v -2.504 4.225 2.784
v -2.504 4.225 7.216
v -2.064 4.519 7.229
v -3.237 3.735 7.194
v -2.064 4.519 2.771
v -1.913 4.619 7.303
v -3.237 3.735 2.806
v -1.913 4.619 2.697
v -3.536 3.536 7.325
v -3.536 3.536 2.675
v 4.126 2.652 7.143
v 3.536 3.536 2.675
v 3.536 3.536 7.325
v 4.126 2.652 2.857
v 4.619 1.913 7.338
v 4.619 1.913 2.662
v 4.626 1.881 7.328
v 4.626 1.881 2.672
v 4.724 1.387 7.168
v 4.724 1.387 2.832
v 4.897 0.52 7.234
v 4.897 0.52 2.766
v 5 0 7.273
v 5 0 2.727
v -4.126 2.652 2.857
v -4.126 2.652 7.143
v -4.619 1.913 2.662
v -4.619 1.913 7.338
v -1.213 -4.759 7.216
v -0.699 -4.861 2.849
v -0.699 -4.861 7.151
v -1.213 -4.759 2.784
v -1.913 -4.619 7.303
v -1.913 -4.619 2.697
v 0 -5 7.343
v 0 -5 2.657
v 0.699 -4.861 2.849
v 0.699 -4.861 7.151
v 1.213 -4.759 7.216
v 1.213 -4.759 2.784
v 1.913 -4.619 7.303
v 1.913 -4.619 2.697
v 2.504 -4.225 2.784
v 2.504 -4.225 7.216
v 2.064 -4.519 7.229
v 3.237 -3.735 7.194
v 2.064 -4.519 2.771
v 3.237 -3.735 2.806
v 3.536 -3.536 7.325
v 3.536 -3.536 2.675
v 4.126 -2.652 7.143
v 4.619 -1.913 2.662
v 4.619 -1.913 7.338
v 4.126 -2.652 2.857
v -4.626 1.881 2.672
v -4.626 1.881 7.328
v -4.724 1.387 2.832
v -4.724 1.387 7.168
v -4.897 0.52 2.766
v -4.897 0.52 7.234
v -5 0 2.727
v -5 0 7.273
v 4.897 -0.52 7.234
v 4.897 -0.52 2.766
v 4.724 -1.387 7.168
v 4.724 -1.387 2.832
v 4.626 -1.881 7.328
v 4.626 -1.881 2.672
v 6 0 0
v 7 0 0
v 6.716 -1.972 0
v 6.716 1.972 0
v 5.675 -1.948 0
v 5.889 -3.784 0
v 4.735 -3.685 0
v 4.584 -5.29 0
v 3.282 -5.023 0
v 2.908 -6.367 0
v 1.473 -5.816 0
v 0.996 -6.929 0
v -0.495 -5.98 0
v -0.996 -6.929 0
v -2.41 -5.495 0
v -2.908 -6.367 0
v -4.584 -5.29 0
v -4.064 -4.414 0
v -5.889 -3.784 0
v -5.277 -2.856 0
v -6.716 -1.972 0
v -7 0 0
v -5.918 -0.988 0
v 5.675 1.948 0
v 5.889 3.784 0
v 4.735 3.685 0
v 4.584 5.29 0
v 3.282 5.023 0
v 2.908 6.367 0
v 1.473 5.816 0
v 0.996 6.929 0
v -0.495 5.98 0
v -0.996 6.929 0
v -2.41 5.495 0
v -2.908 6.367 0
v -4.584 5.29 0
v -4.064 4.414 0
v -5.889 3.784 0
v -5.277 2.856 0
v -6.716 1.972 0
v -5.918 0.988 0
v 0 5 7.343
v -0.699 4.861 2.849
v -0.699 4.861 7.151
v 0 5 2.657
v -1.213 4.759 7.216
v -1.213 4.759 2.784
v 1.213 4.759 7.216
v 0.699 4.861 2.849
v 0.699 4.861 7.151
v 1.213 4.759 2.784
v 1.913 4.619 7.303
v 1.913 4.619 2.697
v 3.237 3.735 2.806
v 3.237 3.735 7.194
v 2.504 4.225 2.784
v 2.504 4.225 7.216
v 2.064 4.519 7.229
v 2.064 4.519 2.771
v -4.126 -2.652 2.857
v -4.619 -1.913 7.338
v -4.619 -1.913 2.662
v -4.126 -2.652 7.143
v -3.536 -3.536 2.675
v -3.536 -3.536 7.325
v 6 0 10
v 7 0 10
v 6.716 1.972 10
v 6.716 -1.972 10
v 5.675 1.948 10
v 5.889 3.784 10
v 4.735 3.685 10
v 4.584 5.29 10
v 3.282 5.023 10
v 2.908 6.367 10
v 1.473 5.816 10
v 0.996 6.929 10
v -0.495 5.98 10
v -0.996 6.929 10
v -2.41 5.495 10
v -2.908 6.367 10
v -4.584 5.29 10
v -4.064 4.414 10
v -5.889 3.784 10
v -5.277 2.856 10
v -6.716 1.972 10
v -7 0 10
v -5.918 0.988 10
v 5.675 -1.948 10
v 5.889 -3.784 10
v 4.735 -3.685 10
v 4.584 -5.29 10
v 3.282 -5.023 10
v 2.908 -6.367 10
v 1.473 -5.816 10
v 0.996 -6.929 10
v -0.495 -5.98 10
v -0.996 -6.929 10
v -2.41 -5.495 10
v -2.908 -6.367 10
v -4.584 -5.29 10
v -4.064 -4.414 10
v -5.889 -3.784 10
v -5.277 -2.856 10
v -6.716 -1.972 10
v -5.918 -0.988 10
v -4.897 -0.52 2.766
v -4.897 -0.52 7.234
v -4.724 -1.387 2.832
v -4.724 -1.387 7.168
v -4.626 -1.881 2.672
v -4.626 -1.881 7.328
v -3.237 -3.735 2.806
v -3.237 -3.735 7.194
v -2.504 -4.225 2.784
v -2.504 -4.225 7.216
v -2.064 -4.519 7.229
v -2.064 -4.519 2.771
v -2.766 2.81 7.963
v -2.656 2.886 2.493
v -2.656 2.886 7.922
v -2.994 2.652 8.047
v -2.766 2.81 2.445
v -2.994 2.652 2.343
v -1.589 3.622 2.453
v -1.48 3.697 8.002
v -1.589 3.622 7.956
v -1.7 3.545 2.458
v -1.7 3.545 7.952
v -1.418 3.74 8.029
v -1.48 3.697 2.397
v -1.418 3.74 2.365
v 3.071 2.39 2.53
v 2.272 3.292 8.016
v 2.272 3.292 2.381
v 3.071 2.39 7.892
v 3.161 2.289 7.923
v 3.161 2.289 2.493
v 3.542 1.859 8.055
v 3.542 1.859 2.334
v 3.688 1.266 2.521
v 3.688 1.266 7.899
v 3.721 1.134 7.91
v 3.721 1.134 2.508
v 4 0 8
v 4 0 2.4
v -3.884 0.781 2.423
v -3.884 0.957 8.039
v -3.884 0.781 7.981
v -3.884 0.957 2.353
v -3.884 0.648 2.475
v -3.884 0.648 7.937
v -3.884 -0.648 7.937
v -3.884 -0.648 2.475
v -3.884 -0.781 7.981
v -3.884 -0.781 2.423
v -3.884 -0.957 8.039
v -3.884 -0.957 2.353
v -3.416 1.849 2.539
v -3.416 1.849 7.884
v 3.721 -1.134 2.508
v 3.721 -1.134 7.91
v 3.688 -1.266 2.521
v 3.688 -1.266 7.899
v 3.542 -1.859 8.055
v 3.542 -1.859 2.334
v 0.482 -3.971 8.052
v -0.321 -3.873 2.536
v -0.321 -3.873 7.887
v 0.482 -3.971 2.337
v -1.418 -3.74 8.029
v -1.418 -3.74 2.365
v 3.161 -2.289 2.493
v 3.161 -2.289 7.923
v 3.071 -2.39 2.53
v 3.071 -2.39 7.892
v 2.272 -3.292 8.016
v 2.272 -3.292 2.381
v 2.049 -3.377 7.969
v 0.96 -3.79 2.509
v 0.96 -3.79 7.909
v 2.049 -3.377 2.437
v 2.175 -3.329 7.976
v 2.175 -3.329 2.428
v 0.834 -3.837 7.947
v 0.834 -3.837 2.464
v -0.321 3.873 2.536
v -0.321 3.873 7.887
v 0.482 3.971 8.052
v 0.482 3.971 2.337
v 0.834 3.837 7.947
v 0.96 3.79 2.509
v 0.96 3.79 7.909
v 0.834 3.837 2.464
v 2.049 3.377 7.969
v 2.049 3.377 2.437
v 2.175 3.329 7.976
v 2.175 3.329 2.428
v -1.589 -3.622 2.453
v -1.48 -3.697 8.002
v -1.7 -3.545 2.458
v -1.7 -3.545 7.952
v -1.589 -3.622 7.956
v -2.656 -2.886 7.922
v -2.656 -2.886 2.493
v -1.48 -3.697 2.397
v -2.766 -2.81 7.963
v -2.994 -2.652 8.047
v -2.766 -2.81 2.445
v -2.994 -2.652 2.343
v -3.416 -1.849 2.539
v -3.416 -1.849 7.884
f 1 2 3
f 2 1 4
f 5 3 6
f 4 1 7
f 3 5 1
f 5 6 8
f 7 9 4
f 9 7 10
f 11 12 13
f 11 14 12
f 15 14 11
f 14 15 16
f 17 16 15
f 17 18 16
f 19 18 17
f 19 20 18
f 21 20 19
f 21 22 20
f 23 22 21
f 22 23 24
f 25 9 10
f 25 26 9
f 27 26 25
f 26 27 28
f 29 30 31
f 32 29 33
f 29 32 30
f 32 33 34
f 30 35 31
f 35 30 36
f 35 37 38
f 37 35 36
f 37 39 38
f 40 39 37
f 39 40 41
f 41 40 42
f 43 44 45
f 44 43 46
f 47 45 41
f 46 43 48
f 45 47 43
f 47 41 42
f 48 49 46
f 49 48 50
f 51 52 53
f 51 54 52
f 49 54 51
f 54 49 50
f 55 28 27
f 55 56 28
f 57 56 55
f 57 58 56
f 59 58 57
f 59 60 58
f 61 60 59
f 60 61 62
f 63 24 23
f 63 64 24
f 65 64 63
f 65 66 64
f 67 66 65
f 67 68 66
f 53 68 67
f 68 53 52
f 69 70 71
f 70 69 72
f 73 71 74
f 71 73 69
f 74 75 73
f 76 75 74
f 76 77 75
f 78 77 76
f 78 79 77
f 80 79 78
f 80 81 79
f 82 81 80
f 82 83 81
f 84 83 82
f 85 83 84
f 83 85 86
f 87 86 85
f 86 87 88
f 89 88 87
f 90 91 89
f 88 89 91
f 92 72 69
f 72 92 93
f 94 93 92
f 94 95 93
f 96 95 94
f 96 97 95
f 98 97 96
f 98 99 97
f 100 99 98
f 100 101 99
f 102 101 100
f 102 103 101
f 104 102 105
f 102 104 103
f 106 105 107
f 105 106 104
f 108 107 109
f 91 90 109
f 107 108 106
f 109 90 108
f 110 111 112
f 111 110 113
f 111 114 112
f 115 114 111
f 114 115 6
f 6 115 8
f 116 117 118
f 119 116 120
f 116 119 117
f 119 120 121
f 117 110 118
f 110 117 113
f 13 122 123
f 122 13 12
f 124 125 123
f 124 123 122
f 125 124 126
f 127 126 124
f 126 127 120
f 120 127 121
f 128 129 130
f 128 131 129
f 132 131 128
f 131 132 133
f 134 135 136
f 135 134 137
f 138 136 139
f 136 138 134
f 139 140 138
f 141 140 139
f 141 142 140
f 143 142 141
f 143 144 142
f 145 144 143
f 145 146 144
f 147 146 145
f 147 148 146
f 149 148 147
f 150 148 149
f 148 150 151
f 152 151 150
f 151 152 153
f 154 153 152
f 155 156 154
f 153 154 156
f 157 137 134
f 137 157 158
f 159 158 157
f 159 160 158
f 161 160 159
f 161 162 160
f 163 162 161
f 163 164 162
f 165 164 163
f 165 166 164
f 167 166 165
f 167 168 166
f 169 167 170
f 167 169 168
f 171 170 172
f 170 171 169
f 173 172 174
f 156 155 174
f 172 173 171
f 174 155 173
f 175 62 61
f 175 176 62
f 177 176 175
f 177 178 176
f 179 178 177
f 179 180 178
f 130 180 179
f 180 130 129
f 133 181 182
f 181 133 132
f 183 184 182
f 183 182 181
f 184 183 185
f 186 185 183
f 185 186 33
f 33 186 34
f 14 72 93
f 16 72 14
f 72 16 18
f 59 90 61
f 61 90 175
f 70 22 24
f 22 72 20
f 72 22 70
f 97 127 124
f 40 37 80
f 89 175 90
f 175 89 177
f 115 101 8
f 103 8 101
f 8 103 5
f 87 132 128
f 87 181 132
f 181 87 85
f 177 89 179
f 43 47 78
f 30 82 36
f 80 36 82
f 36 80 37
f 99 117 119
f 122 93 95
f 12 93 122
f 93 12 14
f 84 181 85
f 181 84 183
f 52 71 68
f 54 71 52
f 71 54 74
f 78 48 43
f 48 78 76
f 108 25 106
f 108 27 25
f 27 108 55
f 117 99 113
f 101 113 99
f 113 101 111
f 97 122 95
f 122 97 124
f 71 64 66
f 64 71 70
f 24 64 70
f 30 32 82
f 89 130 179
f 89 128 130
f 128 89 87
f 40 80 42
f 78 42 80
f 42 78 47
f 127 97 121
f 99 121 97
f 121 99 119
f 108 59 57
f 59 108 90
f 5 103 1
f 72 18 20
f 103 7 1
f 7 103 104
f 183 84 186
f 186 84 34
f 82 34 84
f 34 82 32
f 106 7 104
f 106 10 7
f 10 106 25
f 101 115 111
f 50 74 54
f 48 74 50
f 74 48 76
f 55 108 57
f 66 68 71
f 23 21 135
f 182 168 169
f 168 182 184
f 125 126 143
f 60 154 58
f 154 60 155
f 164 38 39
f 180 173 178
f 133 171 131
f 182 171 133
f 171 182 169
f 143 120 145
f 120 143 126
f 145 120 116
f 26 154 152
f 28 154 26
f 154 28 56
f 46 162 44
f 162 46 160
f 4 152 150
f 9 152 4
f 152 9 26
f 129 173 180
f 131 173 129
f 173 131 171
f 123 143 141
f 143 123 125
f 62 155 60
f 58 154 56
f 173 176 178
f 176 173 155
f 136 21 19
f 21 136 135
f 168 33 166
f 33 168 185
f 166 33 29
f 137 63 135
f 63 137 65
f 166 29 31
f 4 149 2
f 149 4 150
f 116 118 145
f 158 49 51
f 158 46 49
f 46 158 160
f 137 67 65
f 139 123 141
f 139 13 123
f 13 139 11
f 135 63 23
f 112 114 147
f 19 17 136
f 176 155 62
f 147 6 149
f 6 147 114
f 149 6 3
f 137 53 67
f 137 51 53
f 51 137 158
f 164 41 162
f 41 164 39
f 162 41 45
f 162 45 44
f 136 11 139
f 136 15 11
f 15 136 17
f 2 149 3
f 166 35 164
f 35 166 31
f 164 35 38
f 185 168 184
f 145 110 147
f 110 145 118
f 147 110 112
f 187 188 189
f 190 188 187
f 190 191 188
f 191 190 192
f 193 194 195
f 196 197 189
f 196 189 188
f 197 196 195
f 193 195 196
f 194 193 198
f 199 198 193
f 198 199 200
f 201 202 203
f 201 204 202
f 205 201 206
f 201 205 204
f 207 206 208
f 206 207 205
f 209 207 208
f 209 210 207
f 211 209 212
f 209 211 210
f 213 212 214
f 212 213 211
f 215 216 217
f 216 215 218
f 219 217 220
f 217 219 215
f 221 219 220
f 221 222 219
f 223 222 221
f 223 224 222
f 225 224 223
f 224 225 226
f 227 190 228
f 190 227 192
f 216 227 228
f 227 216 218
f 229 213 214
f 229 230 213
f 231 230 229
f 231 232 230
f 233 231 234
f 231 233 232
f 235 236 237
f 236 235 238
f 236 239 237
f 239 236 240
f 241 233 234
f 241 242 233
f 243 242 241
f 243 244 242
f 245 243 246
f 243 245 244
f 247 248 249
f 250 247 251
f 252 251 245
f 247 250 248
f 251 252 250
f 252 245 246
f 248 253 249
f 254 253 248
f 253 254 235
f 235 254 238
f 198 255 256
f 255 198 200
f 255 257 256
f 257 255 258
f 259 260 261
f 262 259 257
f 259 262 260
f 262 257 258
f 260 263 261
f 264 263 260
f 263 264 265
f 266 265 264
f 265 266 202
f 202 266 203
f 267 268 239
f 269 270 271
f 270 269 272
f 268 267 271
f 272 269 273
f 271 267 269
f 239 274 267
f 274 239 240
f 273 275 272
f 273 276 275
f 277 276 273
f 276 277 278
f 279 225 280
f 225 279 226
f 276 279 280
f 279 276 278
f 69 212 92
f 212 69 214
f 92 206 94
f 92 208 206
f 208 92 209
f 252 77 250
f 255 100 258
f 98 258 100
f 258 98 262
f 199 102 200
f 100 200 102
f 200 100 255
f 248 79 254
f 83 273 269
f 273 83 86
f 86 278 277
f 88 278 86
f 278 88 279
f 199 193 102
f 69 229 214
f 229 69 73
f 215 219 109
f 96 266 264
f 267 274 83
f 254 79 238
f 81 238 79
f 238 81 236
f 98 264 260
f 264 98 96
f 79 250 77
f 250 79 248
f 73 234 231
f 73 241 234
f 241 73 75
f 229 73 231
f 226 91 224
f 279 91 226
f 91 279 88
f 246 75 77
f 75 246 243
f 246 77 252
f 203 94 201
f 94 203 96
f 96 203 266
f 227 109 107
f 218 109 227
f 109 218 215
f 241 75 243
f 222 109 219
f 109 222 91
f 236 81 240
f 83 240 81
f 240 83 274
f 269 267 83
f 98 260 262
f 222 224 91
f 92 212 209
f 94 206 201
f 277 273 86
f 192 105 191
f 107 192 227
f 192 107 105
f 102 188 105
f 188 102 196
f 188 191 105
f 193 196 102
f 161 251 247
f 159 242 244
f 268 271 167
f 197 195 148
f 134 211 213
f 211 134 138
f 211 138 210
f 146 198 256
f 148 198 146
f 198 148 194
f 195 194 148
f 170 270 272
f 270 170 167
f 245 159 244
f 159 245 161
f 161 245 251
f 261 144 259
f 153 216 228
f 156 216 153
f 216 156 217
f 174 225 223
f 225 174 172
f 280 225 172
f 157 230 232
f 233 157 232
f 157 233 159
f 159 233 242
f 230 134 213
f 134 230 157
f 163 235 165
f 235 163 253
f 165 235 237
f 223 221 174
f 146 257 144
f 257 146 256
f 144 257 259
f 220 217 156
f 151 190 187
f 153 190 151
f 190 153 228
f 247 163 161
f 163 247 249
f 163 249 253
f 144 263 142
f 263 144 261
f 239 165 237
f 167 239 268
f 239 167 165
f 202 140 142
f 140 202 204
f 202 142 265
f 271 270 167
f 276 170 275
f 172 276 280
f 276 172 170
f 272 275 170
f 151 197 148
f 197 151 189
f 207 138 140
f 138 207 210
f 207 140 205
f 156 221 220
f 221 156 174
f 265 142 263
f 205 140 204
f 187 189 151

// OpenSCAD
//Choose the size of plug you want.
gauge=10;//[3,3.97,4,4.67,5,6,6.35,7,7.94,8,9,9.53,10,11,11.1,12,12.7,13,14,14.3,15,15.9,16,17,18,19,19.1,20,21,22,22.2,23,24,25,25.4,26,27,28,29,29.37,30,30.07,31,31.75,32,33,33.34,34,34.93,35,36,36.5,37,38,38.1,39,39.7,40,41,41.3,42,43,44,44.5,45,46,47,47.6,48,49,50,50.8]

//Choose how thick your ear is 1-10.
depth=10;//[1:10]

//Choose hole size: 10=no hole, 1=thin walls.
thickness=1;//[1:27]

module ear_gauge();
{
	difference()
	{
		union()
		{
			cylinder(depth,gauge/2,gauge/2);
			cylinder(depth/2,(gauge/2)+2,(gauge/3));
			translate([0,0,(depth/2)])cylinder(depth/2,(gauge/3),(gauge/2)+2);
		}
		union()
		{
			cylinder(depth,(gauge/2)-thickness,(gauge/2)-thickness);
			cylinder((depth/2)+1,((gauge/2)+2)-thickness,1);
			translate([0,0,depth/2])cylinder((depth/2),1,((gauge/2)+2)-thickness);
		}
	}
}
